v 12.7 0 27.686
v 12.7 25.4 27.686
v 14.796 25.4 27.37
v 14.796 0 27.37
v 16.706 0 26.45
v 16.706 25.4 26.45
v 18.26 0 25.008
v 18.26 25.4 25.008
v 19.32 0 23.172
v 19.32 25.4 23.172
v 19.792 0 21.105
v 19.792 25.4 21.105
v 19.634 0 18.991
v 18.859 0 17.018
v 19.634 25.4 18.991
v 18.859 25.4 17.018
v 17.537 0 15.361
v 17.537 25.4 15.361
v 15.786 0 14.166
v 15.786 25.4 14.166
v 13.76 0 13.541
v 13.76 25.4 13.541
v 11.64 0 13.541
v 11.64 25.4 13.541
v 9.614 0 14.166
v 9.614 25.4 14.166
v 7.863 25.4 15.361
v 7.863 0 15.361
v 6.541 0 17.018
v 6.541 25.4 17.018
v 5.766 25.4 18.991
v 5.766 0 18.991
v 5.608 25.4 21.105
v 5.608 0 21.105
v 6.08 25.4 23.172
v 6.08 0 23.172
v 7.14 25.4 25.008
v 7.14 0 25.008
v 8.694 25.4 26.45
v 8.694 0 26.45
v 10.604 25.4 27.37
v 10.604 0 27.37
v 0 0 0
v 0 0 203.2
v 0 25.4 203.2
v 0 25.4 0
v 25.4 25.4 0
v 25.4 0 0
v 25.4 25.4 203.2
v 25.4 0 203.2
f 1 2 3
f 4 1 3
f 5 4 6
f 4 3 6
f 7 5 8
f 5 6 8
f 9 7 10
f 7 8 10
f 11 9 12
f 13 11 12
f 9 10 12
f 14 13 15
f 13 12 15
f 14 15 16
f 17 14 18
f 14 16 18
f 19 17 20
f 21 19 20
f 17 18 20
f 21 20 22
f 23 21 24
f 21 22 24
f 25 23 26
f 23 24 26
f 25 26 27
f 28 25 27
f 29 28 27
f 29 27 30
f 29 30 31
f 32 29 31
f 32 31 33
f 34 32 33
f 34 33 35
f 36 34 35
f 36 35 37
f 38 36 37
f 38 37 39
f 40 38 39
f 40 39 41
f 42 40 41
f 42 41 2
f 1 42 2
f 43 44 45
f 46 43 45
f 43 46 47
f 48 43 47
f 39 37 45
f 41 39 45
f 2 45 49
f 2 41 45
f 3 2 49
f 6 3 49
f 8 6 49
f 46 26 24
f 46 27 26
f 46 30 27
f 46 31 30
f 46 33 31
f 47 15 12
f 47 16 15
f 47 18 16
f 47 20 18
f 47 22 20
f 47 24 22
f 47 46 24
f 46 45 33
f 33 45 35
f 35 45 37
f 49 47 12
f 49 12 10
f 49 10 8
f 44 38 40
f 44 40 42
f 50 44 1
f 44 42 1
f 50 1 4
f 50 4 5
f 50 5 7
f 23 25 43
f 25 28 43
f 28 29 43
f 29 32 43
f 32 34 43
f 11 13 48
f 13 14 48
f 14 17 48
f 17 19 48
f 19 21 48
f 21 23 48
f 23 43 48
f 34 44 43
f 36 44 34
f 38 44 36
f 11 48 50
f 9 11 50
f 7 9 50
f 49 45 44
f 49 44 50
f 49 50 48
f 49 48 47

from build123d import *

# Parameters (mm, degrees)
SKETCH_2_W          = 25.4
SKETCH_2_H          = 25.4
EXTRUDE_1_DEPTH     = 203.2
SKETCH_3_R          = 7.112
CUT_EXTRUDE_1_DEPTH = 207.350575478


with BuildPart() as part:
    # 草图2 → 凸台-拉伸1 (new body)
    with BuildSketch(Plane.XY):
        with Locations((12.7, 12.7)):
            Rectangle(SKETCH_2_W, SKETCH_2_H)
    extrude(amount=EXTRUDE_1_DEPTH)

    # 草图3 → 切除-拉伸1 (cut, through all)
    with BuildSketch(Plane(origin=(0, 25.4, 0), x_dir=(1, 0, 0), z_dir=(0, 1, 0))):
        with Locations(Location((12.7, -20.574, 0), (0, 0, 270))):
            Circle(SKETCH_3_R)
    extrude(amount=-CUT_EXTRUDE_1_DEPTH, mode=Mode.SUBTRACT)


solid = part.part
